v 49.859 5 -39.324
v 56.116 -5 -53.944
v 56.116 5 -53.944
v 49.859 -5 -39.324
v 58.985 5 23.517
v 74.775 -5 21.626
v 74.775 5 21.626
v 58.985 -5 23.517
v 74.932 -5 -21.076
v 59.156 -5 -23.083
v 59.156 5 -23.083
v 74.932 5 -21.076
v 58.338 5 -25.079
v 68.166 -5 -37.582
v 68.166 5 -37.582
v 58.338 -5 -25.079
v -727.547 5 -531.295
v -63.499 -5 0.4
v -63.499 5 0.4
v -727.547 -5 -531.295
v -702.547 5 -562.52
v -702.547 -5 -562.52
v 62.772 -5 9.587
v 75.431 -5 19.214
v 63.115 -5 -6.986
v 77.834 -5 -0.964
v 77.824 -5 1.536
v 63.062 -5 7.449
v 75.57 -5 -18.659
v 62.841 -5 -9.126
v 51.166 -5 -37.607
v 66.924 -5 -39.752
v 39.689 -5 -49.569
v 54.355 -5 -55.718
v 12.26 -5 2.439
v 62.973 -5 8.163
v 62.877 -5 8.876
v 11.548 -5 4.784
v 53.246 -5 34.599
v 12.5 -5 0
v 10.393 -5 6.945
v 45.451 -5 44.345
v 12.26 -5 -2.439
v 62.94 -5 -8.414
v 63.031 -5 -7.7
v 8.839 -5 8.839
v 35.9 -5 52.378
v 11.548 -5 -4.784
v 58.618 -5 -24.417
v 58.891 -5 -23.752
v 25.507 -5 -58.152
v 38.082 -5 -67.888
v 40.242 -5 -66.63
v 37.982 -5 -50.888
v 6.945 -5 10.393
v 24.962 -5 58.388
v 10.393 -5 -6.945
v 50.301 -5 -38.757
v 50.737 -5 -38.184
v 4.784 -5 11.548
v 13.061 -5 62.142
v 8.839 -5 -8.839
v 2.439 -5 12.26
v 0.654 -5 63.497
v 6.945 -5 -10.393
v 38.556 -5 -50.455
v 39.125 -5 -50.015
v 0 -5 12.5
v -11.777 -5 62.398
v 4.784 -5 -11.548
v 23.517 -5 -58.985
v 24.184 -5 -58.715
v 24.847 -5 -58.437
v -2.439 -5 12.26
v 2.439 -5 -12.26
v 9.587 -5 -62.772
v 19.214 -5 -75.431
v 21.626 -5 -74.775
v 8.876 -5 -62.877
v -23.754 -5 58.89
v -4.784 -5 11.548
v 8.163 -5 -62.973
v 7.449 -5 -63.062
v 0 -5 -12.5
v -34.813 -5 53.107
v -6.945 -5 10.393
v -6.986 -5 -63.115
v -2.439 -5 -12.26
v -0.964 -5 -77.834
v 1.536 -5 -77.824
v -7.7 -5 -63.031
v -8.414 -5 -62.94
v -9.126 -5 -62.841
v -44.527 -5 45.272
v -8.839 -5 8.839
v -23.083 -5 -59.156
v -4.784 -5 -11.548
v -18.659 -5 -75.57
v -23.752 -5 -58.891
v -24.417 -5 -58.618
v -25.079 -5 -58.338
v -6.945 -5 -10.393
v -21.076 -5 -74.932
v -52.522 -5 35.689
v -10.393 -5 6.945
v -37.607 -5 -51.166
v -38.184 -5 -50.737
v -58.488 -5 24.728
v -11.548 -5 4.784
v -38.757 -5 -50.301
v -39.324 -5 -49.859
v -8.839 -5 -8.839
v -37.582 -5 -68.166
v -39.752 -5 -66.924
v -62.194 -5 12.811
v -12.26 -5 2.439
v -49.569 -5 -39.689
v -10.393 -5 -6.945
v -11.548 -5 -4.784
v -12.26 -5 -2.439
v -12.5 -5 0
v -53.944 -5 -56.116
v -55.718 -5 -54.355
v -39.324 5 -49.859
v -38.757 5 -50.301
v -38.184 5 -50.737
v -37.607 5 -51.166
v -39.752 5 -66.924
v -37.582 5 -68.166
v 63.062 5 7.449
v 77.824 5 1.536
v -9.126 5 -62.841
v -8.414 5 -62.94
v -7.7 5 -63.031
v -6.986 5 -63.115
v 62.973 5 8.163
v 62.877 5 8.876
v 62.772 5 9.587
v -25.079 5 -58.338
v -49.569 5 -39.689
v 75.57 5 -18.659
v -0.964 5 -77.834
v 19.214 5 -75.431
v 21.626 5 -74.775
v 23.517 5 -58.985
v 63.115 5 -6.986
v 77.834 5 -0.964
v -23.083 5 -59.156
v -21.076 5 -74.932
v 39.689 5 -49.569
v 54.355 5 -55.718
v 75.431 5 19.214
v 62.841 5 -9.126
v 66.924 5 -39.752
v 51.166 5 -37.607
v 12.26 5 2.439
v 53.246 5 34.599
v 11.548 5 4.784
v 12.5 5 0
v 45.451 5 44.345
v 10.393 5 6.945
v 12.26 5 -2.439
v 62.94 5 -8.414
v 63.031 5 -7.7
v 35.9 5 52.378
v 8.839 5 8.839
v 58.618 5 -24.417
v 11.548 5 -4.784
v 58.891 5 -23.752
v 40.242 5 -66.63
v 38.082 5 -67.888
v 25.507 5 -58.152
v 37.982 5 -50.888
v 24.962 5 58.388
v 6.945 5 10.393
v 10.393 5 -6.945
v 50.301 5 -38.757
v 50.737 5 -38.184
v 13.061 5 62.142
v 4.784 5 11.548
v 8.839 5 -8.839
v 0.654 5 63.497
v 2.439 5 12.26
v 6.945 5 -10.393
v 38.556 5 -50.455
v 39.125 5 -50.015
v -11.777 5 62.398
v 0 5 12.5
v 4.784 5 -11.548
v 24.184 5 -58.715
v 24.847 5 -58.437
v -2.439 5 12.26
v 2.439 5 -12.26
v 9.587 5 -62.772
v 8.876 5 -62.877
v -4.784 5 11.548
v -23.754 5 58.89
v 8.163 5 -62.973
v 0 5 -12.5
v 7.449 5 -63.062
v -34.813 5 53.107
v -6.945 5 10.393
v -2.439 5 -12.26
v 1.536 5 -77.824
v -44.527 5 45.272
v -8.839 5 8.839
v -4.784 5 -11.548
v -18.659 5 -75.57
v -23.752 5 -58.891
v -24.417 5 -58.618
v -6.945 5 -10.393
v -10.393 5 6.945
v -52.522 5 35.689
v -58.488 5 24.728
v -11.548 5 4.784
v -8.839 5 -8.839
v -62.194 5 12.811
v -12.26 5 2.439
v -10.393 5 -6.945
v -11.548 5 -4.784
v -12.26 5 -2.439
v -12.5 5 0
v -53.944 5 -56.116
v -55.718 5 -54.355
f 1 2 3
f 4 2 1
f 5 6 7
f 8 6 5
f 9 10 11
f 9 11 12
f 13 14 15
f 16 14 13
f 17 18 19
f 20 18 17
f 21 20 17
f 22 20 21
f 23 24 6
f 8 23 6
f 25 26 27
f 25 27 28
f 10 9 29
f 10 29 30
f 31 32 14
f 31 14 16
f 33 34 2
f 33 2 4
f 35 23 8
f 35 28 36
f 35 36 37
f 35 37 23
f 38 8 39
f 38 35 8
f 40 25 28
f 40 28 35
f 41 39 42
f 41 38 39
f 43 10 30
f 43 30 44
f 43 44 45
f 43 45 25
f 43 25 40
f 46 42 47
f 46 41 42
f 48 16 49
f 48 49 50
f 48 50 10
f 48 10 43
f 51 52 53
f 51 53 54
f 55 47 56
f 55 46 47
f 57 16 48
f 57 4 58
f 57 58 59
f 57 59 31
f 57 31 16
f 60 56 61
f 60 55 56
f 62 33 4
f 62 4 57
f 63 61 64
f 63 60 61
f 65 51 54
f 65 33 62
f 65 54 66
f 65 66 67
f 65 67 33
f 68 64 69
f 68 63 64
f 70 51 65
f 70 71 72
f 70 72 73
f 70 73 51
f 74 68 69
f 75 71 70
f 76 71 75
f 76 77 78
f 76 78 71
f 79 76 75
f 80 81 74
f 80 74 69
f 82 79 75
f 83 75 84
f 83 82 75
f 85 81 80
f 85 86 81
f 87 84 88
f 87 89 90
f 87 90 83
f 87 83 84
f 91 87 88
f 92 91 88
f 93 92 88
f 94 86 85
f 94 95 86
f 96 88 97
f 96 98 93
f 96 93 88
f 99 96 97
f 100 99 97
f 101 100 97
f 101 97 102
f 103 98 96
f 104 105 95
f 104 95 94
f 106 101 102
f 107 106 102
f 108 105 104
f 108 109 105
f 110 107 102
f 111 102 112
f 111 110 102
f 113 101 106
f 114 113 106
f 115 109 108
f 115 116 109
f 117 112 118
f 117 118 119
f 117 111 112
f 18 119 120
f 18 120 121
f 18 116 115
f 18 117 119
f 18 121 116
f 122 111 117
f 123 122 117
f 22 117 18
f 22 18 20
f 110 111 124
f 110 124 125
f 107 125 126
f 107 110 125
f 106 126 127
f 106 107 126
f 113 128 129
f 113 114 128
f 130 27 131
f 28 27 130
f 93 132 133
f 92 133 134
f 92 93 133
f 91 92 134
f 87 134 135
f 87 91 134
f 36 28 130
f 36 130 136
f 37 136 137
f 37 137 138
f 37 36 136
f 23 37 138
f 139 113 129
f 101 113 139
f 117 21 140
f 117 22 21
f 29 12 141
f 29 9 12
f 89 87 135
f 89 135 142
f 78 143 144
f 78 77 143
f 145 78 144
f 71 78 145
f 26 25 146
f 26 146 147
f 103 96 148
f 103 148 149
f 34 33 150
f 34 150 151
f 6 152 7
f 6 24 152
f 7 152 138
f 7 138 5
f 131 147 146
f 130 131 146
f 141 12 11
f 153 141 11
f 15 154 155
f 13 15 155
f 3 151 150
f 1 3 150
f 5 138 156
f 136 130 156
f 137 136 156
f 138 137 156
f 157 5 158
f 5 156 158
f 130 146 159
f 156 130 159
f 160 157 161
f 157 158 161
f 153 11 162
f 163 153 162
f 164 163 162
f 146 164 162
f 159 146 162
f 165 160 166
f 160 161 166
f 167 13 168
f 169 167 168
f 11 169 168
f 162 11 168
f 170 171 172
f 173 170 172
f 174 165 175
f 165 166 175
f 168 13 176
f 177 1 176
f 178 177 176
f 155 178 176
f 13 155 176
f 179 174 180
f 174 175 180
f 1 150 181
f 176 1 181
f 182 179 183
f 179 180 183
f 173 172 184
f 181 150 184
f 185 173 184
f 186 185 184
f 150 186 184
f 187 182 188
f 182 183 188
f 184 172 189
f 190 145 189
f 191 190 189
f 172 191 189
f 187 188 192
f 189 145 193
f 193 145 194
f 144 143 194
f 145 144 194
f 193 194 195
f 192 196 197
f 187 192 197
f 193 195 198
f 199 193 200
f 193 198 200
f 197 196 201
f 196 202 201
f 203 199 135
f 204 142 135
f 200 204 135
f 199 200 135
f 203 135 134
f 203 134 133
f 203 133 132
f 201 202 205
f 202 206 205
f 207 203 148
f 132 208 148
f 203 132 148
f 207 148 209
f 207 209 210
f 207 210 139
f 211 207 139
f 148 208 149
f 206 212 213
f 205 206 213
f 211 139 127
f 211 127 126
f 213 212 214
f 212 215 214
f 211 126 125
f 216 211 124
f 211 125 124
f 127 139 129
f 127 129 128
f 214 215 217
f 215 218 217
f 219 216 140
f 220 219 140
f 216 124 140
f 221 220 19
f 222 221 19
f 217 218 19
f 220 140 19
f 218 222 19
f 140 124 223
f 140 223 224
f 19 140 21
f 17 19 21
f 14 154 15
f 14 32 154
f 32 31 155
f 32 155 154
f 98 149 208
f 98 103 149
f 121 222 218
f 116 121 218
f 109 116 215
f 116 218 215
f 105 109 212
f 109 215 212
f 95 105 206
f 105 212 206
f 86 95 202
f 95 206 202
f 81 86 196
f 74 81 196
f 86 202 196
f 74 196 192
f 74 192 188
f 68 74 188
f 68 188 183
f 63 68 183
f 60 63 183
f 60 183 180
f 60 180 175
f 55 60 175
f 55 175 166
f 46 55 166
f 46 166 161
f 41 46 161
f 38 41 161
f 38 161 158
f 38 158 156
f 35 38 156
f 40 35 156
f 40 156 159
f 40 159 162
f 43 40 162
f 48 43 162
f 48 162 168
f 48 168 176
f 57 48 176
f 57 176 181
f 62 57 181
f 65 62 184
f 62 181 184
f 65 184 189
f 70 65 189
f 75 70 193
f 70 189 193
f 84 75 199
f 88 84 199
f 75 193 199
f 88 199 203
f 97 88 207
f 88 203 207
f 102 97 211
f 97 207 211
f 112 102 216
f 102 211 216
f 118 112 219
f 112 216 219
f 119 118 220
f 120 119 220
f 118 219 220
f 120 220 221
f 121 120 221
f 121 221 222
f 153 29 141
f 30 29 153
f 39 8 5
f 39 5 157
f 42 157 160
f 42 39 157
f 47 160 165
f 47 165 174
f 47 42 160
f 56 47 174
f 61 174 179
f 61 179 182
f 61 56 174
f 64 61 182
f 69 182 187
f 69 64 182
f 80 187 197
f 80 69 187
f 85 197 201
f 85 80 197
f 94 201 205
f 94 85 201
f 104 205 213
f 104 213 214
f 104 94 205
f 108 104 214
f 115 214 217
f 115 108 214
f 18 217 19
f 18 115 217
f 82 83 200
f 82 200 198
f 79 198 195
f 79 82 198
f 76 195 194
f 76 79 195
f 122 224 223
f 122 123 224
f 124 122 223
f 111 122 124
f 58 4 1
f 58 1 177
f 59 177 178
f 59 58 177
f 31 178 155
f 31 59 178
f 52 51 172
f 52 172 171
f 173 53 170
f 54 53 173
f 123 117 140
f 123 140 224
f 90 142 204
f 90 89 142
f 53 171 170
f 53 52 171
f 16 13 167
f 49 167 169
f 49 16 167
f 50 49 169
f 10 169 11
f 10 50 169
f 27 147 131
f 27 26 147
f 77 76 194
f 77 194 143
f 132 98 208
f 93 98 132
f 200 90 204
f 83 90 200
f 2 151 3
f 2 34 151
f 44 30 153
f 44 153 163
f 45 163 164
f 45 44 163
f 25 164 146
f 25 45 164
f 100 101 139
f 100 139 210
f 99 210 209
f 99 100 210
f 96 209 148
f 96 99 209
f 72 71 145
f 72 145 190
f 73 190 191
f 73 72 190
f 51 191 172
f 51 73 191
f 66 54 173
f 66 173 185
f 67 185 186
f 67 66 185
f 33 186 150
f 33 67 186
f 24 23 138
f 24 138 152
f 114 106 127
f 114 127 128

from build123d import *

# Parameters (mm, degrees)
F1_DEPTH        = 5
F2_DEPTH        = 5
F2_COPIES_COUNT = 11
F2_COPIES_ANGLE = 150
F3_R            = 12.5
F4_DEPTH        = 10.001


# Not quite as in the source:
# - a pattern or mirror of a feature is missing from the dataset's text; its kind, count and spacing are read off the source's solid


with BuildPart() as f1:
    # F0 (on Front) → F1 (new body, symmetric)
    with BuildSketch(Plane.XZ):
        with BuildLine():
            Line((-25.0008701164, 31.2242933215), (-63.4987428752, 0.3995663471))
            ThreePointArc((-63.4987428752, 0.3995663471), (-59.9818720369, -20.842865133), (-49.5685656478, -39.6888813097))
            Line((-49.5685656478, -39.6888813097), (0, 0))
            Line((0, 0), (-25.0008701164, 31.2242933215))
        make_face()
        with BuildLine():
            Line((0, 0), (62.772077735, 9.5872966381))
            ThreePointArc((62.772077735, 9.5872966381), (-4.6082108818, 63.3325697605), (-63.4987428752, 0.3995663471))
            Line((-63.4987428752, 0.3995663471), (-25.0008701164, 31.2242933215))
            Line((-25.0008701164, 31.2242933215), (0, 0))
        make_face()
        with BuildLine():
            ThreePointArc((-39.3237135407, -49.8587560351), (27.705542678, -57.1371412036), (63.5, 0))
            ThreePointArc((63.5, 0), (63.3177579206, 4.8074454664), (62.772077735, 9.5872966381))
            Line((62.772077735, 9.5872966381), (0, 0))
            Line((0, 0), (-49.5685656478, -39.6888813097))
            ThreePointArc((-49.5685656478, -39.6888813097), (-44.7360694833, -45.065886069), (-39.3237135407, -49.8587560351))
        make_face()
        with BuildLine():
            ThreePointArc((-49.5685656478, -39.6888813097), (-59.9818720369, -20.842865133), (-63.4987428752, 0.3995663471))
            Line((-63.4987428752, 0.3995663471), (-727.5474698493, -531.2952842967))
            Line((-727.5474698493, -531.2952842967), (-702.5465997329, -562.5195776181))
            Line((-702.5465997329, -562.5195776181), (-49.5685656478, -39.6888813097))
        make_face()
    extrude(amount=F1_DEPTH, both=True)

    # F0 (on Front) → F2 (join, symmetric)
    with BuildSketch(Plane.XZ):
        with BuildLine():
            Line((-53.9442142409, -56.1162132047), (-39.3237135407, -49.8587560351))
            ThreePointArc((-39.3237135407, -49.8587560351), (-44.7360694833, -45.065886069), (-49.5685656478, -39.6888813097))
            Line((-49.5685656478, -39.6888813097), (-55.718461724, -54.3549506266))
            Line((-55.718461724, -54.3549506266), (-53.9442142409, -56.1162132047))
        make_face()
    f2 = extrude(amount=F2_DEPTH, both=True)

    # F2_copies: F2 ×11 about axis
    f2_copies_axis = Axis((0, 0, 0), (0, -1, 0))
    for i in range(1, F2_COPIES_COUNT):
        add(f2.rotate(f2_copies_axis, i * F2_COPIES_ANGLE / (F2_COPIES_COUNT - 1)))

    # F3 (on face) → F4 (cut, through all)
    with BuildSketch(Plane(origin=(0, 5, 0), x_dir=(-1, 0, 0), z_dir=(0, 1, 0))):
        Circle(F3_R)
    extrude(amount=-F4_DEPTH, mode=Mode.SUBTRACT)


solid = f1.part
